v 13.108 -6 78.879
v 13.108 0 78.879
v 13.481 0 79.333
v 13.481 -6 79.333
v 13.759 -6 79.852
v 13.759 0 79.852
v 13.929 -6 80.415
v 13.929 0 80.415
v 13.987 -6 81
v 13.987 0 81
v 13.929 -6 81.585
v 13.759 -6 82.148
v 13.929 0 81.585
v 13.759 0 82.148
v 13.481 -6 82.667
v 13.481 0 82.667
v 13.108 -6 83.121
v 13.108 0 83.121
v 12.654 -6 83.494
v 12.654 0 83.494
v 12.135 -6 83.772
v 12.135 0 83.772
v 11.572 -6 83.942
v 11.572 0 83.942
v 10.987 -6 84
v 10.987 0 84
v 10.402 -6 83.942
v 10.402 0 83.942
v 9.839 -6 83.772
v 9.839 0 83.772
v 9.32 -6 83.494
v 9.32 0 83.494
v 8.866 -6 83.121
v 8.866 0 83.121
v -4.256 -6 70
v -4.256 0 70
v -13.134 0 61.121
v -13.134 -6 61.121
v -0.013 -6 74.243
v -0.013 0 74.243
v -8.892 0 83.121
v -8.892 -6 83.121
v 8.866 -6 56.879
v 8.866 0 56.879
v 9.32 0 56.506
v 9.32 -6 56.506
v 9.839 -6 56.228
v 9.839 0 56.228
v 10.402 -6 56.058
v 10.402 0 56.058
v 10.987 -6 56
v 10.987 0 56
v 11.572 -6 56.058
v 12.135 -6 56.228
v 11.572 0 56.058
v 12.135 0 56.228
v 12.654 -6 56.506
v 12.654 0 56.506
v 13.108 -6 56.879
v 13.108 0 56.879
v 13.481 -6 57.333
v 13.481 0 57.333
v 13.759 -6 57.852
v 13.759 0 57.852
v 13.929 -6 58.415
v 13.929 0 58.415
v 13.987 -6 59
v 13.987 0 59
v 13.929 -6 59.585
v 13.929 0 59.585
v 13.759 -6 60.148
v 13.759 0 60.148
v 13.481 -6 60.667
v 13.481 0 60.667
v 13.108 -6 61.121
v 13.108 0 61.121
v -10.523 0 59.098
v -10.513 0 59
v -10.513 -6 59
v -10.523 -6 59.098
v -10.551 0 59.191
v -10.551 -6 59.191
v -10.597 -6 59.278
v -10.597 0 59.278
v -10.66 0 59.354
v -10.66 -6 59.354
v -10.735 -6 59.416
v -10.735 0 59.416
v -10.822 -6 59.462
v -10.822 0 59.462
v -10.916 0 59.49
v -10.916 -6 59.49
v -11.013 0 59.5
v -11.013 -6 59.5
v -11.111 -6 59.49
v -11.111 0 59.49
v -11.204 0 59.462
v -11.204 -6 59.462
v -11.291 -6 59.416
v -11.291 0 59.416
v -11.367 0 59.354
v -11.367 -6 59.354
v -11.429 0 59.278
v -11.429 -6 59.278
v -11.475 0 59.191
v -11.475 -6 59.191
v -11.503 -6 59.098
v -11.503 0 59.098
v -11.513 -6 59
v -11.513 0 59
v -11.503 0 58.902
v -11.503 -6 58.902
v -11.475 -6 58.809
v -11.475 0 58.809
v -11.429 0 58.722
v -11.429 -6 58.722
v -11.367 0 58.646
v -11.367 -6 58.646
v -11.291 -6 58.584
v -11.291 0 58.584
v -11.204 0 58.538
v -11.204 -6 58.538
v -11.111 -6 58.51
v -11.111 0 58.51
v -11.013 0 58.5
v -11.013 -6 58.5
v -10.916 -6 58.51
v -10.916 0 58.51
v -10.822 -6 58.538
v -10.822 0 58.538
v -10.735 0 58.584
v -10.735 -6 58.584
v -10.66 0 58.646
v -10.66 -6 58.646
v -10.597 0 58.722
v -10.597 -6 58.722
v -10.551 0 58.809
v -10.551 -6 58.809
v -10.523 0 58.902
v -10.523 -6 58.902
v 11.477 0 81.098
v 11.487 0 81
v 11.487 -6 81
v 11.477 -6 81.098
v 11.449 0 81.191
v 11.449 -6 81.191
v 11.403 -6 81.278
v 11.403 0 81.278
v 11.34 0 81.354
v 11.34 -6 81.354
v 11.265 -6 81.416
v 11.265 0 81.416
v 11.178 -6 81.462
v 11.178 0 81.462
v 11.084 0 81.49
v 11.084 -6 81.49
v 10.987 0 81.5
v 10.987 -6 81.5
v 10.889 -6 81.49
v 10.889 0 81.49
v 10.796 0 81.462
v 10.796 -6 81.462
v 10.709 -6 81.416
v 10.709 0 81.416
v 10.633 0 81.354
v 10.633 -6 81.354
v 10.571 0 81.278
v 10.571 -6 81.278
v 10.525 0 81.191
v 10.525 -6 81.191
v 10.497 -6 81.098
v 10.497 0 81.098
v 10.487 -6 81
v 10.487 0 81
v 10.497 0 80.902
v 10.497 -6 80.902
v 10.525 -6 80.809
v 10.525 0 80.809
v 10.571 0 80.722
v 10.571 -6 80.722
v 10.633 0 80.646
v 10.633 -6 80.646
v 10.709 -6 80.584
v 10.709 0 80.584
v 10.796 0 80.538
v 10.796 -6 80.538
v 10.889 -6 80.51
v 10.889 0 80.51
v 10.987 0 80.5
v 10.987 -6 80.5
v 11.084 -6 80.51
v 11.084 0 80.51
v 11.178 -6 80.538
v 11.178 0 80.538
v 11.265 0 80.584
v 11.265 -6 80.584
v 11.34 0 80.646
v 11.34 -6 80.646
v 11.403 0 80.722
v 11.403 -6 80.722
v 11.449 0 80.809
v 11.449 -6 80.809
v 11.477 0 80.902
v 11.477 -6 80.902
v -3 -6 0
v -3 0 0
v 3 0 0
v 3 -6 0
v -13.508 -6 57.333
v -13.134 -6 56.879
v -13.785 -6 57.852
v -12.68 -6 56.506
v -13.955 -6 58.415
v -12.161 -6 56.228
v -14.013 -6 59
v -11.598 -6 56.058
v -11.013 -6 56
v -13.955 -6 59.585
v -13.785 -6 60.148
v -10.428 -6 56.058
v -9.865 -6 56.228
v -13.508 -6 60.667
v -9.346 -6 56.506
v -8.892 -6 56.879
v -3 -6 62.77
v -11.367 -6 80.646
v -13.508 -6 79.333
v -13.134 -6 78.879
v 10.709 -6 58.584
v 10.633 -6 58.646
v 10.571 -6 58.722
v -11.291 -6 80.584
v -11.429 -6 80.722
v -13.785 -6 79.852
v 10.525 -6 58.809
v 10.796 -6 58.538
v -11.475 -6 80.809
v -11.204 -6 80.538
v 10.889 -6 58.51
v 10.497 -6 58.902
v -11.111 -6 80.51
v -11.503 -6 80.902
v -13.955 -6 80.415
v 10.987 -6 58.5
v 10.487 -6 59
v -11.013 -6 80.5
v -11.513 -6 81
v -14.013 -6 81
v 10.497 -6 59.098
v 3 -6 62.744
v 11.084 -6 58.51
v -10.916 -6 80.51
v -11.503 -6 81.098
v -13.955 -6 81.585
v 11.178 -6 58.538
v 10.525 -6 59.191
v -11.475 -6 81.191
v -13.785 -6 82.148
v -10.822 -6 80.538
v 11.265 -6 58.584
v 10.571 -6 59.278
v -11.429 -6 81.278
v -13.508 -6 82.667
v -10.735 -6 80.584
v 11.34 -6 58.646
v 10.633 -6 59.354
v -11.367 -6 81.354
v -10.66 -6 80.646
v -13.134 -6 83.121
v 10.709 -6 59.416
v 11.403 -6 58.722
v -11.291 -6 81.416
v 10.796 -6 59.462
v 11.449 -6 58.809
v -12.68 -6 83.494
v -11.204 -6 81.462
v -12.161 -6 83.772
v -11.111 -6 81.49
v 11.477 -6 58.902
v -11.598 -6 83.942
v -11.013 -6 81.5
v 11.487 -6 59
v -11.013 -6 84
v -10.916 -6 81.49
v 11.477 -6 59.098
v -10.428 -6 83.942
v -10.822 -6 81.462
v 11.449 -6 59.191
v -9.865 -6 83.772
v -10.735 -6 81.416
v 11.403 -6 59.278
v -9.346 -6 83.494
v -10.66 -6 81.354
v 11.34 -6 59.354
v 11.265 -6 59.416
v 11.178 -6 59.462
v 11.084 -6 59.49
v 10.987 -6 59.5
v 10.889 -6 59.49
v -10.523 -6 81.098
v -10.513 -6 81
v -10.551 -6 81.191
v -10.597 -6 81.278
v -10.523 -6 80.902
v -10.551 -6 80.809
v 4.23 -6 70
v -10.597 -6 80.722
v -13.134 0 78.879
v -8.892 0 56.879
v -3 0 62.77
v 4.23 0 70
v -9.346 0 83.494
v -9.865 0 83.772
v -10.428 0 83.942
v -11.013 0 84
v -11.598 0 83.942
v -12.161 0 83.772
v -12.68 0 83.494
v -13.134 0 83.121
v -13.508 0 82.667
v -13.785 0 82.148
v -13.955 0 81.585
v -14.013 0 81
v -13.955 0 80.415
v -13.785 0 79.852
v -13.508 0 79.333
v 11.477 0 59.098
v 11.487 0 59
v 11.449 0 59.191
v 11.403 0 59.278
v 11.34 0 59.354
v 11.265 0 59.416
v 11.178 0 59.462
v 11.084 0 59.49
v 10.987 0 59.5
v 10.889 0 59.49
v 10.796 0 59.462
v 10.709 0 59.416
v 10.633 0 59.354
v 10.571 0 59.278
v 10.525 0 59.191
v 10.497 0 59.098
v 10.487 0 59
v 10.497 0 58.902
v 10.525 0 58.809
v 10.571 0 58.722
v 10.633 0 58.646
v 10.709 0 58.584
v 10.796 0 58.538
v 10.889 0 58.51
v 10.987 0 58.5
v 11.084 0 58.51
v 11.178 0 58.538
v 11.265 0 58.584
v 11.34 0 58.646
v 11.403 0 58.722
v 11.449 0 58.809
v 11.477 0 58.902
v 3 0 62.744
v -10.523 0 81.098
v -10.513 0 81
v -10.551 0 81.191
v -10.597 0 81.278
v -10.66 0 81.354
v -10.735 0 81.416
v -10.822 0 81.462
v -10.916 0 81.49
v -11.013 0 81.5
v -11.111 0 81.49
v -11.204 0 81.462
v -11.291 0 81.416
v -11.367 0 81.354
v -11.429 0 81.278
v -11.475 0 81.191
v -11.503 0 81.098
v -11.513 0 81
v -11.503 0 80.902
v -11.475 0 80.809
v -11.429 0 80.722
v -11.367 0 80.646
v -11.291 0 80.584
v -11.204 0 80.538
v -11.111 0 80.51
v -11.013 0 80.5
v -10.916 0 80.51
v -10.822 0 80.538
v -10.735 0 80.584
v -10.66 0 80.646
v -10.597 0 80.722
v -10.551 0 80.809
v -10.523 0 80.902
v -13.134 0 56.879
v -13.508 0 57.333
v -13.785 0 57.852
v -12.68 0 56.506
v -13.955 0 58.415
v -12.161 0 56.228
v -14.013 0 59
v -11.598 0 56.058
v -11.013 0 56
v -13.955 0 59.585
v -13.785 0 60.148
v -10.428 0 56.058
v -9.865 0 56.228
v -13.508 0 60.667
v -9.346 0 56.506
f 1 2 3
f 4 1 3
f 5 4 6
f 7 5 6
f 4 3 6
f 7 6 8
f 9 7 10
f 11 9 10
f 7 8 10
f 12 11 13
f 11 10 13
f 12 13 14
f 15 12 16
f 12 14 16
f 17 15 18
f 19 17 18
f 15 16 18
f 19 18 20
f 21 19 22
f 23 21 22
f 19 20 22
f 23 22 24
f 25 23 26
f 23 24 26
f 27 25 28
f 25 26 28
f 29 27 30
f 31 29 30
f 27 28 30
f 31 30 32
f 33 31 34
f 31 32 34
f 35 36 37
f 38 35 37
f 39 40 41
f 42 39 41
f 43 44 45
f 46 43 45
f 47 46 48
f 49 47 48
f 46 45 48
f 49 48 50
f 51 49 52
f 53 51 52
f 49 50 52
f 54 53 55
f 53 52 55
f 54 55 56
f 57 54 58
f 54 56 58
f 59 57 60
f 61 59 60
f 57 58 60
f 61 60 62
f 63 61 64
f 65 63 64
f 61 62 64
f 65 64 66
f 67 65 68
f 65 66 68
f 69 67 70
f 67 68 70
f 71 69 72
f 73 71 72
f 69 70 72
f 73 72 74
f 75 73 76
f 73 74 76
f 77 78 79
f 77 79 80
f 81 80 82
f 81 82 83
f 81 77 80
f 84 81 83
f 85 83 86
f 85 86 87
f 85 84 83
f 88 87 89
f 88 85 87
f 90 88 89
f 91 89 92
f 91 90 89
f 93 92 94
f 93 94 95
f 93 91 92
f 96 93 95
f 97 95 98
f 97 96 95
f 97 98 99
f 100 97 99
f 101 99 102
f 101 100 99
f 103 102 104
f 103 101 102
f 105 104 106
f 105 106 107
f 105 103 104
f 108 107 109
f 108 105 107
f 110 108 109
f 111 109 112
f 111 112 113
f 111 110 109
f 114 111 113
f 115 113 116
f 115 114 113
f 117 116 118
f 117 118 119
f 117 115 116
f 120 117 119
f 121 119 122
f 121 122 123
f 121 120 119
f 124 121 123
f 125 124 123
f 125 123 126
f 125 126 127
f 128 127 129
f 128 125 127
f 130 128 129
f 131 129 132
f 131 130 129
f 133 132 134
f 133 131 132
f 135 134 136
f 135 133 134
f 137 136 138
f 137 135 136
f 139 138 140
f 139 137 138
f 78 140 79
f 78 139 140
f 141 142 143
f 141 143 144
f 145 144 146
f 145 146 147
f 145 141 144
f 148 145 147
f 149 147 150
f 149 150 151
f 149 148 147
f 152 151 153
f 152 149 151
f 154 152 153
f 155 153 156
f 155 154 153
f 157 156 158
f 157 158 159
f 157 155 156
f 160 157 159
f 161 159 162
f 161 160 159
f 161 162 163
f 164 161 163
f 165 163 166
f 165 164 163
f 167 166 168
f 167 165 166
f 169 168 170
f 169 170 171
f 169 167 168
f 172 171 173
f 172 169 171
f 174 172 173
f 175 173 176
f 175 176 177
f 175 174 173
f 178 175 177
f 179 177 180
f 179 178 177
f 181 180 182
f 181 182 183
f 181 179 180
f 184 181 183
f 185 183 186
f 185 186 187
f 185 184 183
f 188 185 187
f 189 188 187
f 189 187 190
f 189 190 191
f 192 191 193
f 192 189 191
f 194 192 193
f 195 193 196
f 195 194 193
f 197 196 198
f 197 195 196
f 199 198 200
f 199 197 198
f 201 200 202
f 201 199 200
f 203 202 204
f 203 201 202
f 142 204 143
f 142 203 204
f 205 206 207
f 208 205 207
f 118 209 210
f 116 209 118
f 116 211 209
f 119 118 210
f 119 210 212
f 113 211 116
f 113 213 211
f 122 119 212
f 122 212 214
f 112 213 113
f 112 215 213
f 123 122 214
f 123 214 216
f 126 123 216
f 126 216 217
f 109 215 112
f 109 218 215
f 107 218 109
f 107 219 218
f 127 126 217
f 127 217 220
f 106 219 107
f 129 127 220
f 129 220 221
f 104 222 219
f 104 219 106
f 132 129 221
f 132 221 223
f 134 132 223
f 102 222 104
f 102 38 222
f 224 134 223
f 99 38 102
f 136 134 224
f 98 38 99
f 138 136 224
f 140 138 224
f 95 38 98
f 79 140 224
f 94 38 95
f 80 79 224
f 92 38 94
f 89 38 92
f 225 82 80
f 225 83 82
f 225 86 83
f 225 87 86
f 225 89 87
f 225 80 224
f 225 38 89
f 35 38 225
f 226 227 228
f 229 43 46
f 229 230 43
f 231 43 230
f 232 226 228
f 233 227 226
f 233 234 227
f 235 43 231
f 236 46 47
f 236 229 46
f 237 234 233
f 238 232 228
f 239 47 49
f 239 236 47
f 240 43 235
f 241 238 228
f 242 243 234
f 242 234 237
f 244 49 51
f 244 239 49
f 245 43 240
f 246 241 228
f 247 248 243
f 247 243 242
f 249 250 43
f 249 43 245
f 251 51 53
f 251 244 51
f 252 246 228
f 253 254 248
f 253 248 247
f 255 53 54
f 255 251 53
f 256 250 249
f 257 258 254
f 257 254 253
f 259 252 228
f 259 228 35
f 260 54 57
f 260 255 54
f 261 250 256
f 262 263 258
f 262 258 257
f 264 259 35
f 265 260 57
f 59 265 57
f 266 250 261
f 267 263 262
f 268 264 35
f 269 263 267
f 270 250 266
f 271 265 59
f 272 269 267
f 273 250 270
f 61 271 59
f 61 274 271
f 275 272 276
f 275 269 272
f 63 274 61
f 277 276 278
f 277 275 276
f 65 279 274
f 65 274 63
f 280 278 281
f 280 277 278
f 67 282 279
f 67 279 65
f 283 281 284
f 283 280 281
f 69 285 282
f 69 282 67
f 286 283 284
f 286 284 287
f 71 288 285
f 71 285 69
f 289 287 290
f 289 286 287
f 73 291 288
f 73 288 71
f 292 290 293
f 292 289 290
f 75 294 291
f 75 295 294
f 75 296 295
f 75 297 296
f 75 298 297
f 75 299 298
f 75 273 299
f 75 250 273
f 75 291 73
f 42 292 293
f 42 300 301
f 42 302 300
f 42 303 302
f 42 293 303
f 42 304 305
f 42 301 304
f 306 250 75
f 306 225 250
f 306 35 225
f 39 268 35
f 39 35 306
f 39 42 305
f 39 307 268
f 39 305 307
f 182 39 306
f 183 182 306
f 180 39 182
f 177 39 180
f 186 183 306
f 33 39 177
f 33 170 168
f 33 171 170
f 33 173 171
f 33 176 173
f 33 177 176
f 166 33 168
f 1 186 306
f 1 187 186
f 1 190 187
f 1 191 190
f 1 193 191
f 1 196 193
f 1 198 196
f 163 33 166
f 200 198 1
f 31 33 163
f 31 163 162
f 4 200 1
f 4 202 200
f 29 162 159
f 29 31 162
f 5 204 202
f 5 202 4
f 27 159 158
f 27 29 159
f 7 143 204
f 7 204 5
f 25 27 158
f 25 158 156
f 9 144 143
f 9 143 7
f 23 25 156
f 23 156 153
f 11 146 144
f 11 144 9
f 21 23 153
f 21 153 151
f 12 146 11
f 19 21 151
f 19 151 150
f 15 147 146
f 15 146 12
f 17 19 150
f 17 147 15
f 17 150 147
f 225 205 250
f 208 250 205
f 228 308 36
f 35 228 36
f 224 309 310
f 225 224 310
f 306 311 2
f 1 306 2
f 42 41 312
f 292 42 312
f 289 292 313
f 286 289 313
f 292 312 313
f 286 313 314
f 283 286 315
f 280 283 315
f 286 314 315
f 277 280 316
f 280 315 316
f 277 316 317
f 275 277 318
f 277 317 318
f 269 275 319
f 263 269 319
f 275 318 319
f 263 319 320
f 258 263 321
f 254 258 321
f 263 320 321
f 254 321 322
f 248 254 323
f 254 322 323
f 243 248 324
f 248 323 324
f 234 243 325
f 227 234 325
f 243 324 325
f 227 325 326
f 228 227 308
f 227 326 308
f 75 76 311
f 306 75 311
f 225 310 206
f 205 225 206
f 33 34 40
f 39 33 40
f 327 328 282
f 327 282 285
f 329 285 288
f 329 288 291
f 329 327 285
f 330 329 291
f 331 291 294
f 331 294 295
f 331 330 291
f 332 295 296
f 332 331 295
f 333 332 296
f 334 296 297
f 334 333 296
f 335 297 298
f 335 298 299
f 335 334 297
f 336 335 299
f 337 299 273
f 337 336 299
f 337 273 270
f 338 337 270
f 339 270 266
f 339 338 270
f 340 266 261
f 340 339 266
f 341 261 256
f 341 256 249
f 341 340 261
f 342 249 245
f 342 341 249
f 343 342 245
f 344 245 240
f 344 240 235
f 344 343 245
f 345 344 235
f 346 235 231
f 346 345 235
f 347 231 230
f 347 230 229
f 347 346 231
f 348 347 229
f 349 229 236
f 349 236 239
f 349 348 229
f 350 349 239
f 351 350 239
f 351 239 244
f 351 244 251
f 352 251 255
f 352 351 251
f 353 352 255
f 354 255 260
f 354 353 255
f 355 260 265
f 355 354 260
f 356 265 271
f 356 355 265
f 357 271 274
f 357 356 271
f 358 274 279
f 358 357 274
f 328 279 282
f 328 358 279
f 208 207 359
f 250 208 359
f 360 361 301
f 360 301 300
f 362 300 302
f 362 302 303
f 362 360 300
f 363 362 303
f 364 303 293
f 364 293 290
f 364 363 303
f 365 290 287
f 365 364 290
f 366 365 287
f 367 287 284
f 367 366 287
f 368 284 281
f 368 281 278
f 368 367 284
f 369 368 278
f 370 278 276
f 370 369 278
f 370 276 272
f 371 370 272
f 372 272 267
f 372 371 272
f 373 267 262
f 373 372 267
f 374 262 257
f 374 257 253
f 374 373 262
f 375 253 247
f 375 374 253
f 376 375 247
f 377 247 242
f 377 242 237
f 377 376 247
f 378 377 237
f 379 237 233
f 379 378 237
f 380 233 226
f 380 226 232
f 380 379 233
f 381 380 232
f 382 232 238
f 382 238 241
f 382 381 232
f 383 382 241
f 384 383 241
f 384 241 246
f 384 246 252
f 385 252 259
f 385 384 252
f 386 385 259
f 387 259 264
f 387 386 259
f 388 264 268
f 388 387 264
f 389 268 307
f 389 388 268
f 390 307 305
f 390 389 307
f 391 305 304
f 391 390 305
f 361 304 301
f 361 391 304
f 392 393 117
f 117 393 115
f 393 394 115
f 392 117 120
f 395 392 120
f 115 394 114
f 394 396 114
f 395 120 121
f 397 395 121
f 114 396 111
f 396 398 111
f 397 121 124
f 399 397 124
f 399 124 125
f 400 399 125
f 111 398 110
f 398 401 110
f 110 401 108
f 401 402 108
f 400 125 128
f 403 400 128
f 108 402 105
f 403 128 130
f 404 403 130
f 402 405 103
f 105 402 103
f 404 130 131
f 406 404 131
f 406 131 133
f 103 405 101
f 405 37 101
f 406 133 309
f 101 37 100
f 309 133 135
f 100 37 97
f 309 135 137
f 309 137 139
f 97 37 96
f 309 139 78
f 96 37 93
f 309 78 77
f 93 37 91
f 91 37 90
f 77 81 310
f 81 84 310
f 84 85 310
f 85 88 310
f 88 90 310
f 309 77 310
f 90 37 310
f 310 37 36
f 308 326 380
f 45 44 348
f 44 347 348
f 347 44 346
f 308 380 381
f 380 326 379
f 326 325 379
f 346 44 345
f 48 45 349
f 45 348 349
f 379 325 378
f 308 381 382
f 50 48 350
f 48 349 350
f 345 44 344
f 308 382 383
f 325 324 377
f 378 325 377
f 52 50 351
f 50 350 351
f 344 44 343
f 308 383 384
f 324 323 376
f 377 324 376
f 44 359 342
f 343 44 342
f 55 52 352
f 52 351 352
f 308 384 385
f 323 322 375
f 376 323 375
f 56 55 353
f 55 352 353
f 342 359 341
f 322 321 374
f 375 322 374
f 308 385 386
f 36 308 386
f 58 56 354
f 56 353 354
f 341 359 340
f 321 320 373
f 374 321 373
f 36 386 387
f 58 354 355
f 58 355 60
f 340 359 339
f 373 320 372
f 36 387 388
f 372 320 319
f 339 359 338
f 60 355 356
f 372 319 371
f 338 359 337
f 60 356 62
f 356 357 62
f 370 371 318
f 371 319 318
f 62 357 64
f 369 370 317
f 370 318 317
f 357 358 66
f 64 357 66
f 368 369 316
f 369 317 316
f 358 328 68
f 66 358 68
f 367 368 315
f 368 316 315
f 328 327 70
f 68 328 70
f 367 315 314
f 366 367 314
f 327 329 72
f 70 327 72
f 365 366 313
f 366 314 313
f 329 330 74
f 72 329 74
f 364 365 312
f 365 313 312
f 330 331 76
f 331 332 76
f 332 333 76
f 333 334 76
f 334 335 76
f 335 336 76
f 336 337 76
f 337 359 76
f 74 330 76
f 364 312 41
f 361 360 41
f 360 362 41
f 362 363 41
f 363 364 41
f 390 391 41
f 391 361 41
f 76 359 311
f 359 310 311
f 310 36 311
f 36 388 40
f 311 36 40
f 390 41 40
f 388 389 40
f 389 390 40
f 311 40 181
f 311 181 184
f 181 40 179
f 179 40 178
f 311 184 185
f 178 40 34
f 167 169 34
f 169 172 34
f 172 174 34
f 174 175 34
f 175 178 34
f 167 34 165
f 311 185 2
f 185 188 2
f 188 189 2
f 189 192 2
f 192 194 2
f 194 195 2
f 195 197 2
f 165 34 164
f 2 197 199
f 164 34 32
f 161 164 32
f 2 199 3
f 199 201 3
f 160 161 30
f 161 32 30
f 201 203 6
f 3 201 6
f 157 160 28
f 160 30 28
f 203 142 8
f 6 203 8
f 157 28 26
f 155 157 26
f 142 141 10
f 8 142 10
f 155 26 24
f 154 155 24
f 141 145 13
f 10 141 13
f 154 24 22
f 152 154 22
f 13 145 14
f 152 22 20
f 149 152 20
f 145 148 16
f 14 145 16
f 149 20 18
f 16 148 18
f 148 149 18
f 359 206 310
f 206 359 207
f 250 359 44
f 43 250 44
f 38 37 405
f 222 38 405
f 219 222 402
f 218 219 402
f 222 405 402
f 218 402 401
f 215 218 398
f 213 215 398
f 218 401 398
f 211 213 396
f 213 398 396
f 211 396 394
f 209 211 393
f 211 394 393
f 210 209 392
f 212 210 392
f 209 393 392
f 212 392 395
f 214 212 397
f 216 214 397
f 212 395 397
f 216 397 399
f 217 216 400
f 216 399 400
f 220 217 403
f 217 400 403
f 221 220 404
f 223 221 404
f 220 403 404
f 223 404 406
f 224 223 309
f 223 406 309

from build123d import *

# Parameters (mm, degrees)
F0_R     = 0.5
F1_DEPTH = 6


with BuildPart() as f1:
    # F0 (on Front) → F1 (new body)
    with BuildSketch(Plane.XZ):
        with BuildLine():
            Line((-3, 62.770455), (-3, 0))
            Line((-3, 0), (3, 0))
            Line((3, 0), (3, 62.744264))
            Line((3, 62.744264), (8.865584, 56.87868))
            ThreePointArc((8.865584, 56.87868), (13.108225, 56.87868), (13.108225, 61.12132))
            Line((13.108225, 61.12132), (4.229545, 70))
            Line((4.229545, 70), (13.108225, 78.87868))
            ThreePointArc((13.108225, 78.87868), (13.108225, 83.12132), (8.865584, 83.12132))
            Line((8.865584, 83.12132), (-0.013096, 74.242641))
            Line((-0.013096, 74.242641), (-8.891775, 83.12132))
            ThreePointArc((-8.891775, 83.12132), (-13.134416, 83.12132), (-13.134416, 78.87868))
            Line((-13.134416, 78.87868), (-4.255736, 70))
            Line((-4.255736, 70), (-13.134416, 61.12132))
            ThreePointArc((-13.134416, 61.12132), (-13.134416, 56.87868), (-8.891775, 56.87868))
            Line((-8.891775, 56.87868), (-3, 62.770455))
        make_face()
        with Locations((-11.013096, 59)):
            Circle(F0_R, mode=Mode.SUBTRACT)
        with Locations((-11.013096, 81)):
            Circle(F0_R, mode=Mode.SUBTRACT)
        with Locations((10.986904, 59)):
            Circle(F0_R, mode=Mode.SUBTRACT)
        with Locations((10.986904, 81)):
            Circle(F0_R, mode=Mode.SUBTRACT)
    extrude(amount=F1_DEPTH)


solid = f1.part
